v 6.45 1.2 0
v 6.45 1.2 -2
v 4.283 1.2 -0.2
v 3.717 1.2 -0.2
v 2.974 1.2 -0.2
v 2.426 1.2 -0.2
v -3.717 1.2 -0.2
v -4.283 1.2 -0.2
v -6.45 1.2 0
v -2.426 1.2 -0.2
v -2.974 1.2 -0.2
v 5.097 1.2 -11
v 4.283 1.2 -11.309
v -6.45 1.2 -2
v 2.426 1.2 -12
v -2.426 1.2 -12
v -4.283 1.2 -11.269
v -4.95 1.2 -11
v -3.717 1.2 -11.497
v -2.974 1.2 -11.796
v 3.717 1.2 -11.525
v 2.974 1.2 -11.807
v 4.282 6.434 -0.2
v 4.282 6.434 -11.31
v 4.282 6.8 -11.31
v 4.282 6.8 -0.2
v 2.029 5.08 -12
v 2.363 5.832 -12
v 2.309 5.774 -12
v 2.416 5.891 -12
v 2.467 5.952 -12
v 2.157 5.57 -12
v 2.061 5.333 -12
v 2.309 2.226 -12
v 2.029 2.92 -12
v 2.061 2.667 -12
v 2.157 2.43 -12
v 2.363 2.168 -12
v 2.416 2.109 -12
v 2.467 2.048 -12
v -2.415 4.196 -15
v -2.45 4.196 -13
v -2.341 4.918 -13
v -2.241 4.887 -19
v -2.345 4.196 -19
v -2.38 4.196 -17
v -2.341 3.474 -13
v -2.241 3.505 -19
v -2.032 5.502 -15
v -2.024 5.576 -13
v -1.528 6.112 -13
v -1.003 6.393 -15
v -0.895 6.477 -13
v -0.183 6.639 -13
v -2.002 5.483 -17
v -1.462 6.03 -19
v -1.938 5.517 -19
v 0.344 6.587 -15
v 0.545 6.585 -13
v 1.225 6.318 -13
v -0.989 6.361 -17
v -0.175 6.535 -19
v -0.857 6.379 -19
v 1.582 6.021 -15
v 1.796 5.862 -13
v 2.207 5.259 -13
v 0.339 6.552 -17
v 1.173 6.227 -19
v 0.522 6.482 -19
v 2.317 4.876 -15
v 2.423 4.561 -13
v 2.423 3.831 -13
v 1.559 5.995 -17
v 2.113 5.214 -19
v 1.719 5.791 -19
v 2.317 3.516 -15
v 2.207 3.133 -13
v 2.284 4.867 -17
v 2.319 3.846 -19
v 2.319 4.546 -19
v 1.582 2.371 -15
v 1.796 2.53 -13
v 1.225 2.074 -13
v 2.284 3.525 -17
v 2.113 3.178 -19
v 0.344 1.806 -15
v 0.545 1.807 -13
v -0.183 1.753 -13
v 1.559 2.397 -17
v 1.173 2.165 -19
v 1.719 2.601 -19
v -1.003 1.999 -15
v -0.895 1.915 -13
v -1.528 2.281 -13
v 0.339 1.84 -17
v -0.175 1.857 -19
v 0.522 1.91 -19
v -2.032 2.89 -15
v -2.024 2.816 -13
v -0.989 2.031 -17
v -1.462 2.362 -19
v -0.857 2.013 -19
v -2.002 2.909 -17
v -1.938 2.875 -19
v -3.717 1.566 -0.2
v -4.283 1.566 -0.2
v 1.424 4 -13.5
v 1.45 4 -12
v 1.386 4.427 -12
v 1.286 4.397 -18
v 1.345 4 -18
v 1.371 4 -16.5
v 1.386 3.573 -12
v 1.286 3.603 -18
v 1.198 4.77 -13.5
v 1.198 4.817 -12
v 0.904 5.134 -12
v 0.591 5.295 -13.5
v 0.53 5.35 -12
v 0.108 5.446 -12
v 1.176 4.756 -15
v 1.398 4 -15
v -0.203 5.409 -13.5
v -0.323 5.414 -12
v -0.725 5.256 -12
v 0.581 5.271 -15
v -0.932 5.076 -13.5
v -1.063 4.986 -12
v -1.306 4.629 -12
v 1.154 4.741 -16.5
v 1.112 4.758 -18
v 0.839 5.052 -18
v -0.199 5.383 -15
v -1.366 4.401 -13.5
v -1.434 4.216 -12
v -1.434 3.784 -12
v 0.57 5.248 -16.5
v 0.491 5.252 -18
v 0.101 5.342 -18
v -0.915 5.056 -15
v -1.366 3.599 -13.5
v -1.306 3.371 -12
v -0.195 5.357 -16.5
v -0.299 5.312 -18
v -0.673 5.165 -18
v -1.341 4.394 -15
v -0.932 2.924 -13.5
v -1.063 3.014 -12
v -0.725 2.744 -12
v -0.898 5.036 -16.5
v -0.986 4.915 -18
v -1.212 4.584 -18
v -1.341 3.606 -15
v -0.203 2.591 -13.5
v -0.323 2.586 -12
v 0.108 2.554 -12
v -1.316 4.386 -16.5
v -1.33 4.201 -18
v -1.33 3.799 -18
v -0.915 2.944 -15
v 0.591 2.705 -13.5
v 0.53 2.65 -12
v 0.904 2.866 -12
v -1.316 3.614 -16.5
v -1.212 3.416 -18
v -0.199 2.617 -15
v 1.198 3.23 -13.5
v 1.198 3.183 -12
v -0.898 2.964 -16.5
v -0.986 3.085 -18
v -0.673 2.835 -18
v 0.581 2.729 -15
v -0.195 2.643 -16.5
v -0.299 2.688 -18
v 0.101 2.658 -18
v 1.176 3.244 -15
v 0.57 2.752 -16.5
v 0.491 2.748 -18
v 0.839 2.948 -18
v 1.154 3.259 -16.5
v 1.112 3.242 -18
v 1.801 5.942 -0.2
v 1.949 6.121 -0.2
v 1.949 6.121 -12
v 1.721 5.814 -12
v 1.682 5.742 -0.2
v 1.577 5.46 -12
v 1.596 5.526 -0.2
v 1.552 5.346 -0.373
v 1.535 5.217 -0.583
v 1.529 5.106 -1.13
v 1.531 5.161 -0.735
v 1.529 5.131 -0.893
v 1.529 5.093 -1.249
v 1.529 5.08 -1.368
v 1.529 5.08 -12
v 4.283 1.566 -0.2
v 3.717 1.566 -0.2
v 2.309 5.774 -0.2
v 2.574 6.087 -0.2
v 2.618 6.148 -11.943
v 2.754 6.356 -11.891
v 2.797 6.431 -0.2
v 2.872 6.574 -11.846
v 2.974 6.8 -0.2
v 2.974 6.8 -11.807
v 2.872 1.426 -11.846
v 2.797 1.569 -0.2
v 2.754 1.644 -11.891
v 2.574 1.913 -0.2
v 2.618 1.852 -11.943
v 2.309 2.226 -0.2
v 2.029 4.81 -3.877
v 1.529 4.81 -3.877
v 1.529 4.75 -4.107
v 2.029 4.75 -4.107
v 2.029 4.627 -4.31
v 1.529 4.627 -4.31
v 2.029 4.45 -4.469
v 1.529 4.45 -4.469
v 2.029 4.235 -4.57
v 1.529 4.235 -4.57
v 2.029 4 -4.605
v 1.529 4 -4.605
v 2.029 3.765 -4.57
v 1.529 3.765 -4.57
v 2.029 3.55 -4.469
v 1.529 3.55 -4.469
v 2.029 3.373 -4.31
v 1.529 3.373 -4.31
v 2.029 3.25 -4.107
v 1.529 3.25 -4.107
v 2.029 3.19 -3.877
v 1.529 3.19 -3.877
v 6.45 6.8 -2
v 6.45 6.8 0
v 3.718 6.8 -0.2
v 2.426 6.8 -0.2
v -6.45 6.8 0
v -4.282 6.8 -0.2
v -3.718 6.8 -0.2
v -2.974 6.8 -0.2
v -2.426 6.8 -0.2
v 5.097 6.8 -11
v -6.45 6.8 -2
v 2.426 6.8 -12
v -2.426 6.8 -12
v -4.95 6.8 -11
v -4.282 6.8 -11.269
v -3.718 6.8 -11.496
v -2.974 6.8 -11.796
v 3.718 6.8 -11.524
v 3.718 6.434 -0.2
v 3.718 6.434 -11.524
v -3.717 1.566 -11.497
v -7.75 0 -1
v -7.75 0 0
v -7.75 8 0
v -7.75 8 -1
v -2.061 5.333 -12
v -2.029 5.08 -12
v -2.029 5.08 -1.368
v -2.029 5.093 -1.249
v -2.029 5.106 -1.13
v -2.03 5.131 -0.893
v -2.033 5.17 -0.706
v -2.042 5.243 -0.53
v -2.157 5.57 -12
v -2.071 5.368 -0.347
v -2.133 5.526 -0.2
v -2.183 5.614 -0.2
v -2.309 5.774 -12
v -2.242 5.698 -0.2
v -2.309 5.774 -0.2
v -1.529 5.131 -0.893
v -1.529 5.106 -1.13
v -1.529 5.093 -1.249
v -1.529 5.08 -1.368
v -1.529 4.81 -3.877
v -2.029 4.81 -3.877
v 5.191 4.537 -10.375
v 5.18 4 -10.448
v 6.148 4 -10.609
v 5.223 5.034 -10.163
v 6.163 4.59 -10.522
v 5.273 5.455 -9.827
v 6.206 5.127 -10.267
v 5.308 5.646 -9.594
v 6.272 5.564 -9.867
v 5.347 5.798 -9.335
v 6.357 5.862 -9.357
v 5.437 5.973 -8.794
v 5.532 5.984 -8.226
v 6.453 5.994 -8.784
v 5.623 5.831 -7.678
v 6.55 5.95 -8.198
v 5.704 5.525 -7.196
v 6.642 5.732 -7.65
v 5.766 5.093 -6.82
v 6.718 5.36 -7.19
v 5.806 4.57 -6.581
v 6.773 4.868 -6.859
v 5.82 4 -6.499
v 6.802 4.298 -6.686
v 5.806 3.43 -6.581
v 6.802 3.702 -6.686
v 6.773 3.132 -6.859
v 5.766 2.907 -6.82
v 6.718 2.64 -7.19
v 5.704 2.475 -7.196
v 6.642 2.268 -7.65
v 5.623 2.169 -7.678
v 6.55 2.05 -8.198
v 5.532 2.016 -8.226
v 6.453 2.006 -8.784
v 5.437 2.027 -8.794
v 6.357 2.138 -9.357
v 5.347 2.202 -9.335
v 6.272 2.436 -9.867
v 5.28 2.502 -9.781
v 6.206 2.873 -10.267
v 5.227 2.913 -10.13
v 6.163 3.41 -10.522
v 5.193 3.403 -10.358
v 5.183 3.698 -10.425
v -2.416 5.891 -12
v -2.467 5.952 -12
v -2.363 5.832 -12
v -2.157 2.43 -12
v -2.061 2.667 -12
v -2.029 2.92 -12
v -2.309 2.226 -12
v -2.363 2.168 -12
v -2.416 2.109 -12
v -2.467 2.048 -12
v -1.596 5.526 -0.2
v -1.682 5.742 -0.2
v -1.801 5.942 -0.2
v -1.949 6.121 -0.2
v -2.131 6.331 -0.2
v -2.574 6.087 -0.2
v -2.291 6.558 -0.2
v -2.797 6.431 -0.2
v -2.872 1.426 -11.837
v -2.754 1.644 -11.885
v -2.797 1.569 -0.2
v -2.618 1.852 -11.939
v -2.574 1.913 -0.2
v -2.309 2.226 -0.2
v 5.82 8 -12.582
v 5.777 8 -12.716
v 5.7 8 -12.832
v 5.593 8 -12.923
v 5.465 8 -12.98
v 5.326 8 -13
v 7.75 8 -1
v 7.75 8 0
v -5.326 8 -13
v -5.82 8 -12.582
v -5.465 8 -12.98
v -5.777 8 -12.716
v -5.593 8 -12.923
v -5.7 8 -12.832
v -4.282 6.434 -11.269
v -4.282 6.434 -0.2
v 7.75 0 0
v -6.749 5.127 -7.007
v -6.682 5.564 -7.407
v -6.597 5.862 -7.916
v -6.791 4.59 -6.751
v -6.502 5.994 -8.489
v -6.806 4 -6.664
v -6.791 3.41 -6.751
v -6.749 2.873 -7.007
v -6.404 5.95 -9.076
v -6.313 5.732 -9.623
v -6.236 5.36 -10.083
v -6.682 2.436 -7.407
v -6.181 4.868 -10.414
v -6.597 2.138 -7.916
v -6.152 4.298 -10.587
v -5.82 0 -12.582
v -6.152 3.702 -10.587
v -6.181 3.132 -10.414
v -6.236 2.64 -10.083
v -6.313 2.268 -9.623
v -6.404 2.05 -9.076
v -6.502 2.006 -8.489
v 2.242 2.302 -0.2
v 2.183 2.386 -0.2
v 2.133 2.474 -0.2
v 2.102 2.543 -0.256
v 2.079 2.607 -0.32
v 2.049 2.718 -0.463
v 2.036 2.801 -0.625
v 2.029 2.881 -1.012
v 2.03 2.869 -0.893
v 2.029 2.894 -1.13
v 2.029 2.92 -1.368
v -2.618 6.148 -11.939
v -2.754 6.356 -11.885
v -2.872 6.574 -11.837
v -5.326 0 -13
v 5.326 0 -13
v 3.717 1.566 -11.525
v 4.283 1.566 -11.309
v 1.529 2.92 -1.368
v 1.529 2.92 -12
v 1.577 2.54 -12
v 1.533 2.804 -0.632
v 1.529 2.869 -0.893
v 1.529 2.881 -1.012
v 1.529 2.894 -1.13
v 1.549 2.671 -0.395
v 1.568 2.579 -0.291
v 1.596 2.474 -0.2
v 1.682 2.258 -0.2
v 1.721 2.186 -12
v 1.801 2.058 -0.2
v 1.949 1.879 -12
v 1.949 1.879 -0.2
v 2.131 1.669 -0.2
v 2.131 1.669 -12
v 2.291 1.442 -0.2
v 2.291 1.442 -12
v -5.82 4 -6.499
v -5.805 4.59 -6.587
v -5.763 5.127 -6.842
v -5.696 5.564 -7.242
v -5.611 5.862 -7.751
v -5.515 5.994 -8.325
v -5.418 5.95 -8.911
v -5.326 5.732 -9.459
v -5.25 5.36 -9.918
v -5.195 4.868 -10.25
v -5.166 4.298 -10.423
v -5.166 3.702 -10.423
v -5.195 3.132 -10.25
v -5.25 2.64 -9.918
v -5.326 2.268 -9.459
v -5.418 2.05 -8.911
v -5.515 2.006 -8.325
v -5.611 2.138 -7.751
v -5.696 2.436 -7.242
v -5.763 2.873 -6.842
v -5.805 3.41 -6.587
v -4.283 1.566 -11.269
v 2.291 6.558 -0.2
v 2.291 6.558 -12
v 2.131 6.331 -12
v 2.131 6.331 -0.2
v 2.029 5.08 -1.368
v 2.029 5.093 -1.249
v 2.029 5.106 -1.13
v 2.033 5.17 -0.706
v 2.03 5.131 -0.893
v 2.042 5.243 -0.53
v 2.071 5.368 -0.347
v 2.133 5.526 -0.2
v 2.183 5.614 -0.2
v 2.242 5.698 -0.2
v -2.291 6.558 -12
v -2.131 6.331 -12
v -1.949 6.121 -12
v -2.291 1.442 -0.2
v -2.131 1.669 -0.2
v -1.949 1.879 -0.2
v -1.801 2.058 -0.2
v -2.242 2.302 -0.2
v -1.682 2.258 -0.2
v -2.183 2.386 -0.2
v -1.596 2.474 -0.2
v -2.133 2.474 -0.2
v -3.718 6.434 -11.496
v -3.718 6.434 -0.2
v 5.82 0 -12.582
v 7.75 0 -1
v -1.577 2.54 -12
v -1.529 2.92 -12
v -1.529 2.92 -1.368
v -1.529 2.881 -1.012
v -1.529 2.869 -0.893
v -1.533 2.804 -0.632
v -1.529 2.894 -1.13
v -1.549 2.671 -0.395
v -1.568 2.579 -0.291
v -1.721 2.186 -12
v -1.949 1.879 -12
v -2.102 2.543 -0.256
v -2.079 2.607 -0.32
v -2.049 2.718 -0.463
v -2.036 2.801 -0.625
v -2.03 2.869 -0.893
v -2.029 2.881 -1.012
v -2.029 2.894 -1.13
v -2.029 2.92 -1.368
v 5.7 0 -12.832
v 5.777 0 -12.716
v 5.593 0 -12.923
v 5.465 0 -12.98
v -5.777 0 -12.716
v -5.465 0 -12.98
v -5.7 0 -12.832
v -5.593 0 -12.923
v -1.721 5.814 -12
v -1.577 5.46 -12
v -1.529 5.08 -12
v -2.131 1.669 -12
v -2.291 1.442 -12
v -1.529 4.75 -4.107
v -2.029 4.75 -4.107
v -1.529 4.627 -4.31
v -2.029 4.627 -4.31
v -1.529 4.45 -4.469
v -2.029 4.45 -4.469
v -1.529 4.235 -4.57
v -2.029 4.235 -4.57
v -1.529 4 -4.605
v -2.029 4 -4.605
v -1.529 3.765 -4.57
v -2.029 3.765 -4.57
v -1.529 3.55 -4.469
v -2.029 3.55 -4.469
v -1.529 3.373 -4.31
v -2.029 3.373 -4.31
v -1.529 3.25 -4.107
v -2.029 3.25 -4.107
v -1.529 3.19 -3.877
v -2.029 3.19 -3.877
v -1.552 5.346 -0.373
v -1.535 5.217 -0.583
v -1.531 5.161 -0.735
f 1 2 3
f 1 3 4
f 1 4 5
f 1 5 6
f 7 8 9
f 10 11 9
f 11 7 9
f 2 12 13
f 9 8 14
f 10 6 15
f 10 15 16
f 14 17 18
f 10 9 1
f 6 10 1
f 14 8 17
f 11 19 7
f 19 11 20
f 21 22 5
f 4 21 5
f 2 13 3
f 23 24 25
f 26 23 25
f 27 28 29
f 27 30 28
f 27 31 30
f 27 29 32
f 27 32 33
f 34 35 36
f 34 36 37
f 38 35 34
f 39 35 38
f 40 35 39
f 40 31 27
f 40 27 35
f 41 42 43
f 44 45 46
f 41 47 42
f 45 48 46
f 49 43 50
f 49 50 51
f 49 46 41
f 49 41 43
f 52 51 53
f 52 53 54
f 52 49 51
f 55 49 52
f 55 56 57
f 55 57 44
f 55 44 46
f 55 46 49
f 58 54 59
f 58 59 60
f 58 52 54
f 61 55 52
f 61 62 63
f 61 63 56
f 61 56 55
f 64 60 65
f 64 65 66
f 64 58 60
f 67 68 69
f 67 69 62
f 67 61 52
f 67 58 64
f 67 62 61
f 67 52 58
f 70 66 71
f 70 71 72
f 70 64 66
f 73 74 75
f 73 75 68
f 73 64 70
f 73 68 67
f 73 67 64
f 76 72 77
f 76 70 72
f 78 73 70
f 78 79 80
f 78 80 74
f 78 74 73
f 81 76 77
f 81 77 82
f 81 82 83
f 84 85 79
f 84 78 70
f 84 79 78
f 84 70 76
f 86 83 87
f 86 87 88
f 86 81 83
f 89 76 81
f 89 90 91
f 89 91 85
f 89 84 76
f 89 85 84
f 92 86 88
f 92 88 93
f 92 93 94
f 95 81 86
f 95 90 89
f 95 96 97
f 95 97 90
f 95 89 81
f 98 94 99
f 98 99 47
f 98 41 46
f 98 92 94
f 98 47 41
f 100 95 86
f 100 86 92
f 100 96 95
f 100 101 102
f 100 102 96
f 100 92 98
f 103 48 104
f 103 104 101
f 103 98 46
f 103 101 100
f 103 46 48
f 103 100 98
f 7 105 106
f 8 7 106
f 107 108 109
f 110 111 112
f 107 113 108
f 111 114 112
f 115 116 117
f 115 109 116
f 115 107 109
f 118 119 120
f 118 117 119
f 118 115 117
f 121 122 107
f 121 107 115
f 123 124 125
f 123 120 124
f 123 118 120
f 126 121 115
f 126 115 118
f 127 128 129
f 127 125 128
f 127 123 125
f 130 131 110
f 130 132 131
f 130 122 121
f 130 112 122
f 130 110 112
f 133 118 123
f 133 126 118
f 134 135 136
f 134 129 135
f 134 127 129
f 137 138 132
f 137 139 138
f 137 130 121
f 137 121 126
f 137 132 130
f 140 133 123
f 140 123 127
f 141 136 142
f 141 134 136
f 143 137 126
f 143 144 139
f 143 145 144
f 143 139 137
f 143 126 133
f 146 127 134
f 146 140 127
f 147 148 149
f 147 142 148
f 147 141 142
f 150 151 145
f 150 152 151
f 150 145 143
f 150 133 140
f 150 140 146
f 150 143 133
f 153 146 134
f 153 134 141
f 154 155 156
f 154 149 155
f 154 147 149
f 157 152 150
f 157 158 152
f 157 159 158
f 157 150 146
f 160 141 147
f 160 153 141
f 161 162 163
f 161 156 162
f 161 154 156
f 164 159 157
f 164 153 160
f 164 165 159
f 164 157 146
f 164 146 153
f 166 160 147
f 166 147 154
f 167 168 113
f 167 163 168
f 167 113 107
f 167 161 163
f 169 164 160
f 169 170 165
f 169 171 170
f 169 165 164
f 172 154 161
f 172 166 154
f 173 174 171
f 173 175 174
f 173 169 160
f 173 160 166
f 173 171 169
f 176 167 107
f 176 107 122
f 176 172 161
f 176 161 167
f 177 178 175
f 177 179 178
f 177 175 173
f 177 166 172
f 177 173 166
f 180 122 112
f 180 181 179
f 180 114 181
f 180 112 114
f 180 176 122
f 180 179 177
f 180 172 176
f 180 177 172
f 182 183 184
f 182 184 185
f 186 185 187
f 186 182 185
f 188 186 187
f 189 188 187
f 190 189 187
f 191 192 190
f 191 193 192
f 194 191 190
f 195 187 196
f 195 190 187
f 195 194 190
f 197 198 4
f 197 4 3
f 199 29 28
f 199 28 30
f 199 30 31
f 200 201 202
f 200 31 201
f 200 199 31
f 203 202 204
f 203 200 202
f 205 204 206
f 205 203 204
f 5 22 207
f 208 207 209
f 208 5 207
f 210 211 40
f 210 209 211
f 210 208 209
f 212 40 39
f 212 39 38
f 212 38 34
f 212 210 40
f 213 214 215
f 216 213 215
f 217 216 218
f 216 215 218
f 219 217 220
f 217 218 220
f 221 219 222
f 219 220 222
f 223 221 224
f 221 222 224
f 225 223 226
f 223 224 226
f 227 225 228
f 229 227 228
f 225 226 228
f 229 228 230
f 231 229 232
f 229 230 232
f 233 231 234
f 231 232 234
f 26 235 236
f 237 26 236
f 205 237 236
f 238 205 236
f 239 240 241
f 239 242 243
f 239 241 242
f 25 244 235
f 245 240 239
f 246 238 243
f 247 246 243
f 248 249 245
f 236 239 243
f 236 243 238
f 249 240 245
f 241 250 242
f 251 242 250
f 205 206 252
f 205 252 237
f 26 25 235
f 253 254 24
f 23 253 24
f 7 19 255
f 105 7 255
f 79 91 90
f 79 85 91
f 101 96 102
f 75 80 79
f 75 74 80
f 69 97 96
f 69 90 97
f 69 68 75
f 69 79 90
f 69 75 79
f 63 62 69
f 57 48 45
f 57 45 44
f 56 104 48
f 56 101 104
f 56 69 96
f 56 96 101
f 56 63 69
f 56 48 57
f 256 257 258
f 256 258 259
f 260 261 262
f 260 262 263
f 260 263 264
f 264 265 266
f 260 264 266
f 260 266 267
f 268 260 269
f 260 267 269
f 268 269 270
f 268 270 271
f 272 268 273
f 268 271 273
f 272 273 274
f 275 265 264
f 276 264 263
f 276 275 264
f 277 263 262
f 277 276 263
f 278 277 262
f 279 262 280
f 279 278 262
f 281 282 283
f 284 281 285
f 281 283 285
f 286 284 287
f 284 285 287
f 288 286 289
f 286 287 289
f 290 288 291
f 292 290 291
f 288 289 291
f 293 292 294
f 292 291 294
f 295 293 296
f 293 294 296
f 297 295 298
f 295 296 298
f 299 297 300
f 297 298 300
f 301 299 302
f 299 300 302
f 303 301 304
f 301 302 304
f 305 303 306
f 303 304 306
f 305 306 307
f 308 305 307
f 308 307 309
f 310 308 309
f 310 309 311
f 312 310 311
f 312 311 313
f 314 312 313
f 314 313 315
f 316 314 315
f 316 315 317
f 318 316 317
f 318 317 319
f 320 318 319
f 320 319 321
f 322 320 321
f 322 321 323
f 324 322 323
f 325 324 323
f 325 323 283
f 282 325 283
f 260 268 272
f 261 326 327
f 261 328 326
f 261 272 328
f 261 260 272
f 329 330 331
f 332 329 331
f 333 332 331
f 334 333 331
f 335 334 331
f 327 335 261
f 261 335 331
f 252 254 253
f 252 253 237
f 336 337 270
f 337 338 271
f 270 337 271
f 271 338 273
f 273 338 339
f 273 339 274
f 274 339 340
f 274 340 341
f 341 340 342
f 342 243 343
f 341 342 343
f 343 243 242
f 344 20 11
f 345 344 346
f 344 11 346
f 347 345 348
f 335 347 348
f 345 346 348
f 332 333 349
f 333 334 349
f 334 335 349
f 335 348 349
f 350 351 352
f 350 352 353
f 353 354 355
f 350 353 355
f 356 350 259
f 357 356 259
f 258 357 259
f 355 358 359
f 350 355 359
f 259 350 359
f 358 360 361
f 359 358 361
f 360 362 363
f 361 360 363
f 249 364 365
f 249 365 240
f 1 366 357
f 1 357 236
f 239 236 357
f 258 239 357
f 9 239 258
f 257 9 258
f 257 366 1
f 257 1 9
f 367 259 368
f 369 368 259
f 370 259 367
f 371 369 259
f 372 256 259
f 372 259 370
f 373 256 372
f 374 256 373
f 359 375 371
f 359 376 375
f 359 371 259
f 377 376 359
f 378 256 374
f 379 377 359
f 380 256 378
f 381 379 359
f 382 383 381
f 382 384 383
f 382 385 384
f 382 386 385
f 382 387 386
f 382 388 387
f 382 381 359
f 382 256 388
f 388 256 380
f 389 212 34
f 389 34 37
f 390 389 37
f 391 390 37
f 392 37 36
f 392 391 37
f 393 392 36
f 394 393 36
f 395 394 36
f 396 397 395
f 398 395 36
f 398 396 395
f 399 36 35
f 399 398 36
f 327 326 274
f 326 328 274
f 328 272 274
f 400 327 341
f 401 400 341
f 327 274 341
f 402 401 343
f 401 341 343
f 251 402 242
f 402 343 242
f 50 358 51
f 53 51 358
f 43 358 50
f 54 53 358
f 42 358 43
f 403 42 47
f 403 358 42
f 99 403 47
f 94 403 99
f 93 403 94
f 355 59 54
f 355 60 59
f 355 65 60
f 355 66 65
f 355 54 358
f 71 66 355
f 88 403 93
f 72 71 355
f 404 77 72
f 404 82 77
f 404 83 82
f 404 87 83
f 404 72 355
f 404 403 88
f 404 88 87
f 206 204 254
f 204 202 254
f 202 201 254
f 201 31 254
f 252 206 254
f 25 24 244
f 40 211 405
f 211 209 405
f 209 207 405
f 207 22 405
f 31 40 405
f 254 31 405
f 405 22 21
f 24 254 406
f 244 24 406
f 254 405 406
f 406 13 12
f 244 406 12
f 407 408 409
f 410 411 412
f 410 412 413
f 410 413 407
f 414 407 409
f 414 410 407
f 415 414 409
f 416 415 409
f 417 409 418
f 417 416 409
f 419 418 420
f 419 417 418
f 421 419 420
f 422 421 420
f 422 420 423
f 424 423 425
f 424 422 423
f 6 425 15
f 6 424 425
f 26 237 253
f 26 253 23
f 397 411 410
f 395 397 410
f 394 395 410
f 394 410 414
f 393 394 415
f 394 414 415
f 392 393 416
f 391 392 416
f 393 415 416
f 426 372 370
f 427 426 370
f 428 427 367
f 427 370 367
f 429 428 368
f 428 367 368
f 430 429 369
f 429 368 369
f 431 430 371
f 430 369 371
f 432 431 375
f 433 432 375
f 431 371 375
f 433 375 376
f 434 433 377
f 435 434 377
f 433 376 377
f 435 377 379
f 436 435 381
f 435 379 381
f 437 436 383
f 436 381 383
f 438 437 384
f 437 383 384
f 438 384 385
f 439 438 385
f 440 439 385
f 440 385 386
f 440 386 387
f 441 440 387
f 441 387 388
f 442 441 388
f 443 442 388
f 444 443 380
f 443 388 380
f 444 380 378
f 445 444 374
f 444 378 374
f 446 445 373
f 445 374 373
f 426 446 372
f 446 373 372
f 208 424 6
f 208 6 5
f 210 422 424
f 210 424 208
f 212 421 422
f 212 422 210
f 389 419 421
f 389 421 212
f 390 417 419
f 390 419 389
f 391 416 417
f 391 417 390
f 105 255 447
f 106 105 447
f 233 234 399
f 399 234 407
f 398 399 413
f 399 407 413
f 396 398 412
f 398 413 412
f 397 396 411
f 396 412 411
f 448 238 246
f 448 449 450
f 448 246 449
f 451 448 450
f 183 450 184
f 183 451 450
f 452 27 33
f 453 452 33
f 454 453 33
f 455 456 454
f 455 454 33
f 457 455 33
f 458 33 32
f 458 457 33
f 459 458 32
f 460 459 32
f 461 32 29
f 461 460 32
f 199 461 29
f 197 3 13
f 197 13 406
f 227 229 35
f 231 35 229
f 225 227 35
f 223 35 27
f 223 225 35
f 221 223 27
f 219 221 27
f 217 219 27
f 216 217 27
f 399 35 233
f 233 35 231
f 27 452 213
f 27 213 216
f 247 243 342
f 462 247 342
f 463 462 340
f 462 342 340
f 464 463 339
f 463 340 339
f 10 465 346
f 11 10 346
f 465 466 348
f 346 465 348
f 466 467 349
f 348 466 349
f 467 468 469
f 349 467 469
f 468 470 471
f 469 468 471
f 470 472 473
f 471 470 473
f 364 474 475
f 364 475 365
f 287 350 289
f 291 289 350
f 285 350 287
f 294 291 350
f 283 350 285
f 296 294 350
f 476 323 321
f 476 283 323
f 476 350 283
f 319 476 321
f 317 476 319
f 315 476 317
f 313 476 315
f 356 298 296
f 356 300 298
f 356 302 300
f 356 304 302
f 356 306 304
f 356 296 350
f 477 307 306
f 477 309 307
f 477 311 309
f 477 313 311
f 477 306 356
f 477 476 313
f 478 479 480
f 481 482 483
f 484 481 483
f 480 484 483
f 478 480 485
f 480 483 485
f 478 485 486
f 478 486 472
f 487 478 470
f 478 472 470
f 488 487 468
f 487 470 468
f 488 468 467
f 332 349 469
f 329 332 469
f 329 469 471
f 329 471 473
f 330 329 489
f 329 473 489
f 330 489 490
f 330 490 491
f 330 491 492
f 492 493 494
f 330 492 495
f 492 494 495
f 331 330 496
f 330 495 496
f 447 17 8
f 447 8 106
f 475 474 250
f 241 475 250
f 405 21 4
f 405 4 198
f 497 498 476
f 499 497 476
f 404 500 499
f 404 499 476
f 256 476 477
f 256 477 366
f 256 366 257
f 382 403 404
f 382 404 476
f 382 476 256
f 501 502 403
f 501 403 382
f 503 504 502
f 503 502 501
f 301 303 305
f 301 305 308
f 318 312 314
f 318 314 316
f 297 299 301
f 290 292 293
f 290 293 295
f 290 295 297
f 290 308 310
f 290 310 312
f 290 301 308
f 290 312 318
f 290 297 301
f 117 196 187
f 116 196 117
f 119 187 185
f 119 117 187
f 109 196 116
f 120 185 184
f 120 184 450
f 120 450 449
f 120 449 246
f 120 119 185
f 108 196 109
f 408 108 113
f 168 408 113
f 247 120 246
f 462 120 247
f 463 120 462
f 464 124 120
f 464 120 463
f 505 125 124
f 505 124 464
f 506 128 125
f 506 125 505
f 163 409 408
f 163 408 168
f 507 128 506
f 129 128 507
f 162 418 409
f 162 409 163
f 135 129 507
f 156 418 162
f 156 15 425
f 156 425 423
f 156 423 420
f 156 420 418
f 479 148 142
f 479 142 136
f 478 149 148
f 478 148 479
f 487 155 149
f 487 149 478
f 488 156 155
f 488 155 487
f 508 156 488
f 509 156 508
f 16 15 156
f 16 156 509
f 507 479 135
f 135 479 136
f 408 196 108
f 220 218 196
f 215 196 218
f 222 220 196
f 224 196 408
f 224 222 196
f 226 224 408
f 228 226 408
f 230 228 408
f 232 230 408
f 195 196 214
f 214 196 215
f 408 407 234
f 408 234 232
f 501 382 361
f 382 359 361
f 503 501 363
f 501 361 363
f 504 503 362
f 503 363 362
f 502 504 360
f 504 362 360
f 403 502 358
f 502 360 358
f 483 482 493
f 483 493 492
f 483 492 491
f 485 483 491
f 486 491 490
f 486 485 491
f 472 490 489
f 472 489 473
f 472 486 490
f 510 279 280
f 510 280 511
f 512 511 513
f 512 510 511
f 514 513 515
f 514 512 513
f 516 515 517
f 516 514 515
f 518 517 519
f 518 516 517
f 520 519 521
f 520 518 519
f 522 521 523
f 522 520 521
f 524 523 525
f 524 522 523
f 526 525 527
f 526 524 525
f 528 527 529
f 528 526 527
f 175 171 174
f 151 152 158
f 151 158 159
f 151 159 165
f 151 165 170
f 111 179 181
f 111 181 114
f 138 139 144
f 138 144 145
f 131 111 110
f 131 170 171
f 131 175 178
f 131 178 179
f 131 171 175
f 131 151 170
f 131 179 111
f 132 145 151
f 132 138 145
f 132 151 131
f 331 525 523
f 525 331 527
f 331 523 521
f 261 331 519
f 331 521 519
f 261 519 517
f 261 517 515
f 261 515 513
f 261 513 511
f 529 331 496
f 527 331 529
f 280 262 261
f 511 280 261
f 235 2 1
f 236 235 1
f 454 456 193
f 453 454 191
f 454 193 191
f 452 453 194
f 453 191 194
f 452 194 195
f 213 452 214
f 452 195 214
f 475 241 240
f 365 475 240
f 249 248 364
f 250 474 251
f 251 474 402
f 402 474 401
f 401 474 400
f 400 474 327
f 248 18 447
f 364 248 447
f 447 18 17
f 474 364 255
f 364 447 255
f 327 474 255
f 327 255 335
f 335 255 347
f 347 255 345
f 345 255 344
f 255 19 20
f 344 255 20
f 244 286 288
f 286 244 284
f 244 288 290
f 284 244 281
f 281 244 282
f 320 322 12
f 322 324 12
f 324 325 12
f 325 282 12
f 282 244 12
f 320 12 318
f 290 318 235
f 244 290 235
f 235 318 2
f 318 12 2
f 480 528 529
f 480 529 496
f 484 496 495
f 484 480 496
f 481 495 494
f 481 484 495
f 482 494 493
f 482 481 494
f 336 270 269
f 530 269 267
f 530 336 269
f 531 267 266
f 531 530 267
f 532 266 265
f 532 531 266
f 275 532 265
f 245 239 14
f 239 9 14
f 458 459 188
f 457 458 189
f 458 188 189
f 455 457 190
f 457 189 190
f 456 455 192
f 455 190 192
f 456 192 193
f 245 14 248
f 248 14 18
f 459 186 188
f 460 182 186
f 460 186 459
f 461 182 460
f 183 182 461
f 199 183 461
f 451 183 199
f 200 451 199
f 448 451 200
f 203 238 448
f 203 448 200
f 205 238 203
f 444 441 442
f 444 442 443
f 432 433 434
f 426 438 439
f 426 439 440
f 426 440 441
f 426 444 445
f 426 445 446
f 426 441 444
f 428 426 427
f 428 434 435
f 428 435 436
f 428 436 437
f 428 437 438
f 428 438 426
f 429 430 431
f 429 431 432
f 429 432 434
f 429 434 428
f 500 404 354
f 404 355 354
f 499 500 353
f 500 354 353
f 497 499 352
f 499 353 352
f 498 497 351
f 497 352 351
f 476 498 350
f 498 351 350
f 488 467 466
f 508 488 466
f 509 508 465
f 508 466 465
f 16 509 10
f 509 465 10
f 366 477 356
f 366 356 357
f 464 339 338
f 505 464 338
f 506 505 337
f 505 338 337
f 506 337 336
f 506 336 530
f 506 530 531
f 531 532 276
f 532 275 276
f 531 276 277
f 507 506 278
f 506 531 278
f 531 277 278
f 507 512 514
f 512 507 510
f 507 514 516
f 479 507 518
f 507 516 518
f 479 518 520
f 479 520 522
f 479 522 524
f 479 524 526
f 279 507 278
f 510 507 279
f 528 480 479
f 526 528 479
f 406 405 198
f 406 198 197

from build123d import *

# Parameters (mm, degrees)
BOSS_EXTRUDE1_DEPTH     = 8
FILLET1_R               = 0.5
SKETCH5_R               = 2.45
BOSS_EXTRUDE2_DEPTH     = 6
BOSS_EXTRUDE2_TAPER     = 1
CUT_EXTRUDE4_DEPTH      = 2.8
CUT_EXTRUDE4_DEPTH_BACK = 2.8
SKETCH10_R              = 1.45
CUT_EXTRUDE5_DEPTH      = 6
CUT_EXTRUDE5_TAPER      = 1
SKETCH7_R               = 2
CUT_EXTRUDE6_DEPTH      = 1
SKETCH8_R               = 2
CUT_EXTRUDE7_DEPTH      = 1
BOSS_EXTRUDE4_START     = -0.2
SKETCH11_W              = 0.564613496
SKETCH11_H              = 0.366319064
SKETCH11_W_2            = 0.56674541
SKETCH11_H_2            = 0.366442951
BOSS_EXTRUDE4_DEPTH     = 12.3
CUT_EXTRUDE8_DEPTH      = 3
CUT_EXTRUDE8_DEPTH_BACK = 2.5


with BuildPart() as part:
    # Sketch3 → Boss-Extrude1 (new body)
    with BuildSketch(Plane(origin=(0, 0, 0), x_dir=(1, 0, 0), z_dir=(0, 1, 0))):
        Polygon((7.75, 0), (-7.75, 0), (-7.75, 1), (-5.75, 13), (5.75, 13), (7.75, 1), align=None)
    extrude(amount=BOSS_EXTRUDE1_DEPTH)

    # Fillet1
    fillet1_edges = [part.edges().sort_by_distance(p)[0] for p in [
        (5.75, 4, -13),
        (-5.75, 4, -13),
    ]]
    fillet(fillet1_edges, radius=FILLET1_R)

    # Sketch5 → Boss-Extrude2 (add)
    with BuildSketch(Plane(origin=(0, 0, -13), x_dir=(-1, 0, 0), z_dir=(0, 0, -1))):
        with Locations((0, 4.19602759)):
            Circle(SKETCH5_R)
    extrude(amount=BOSS_EXTRUDE2_DEPTH, taper=BOSS_EXTRUDE2_TAPER)

    # Sketch9 → Cut-Extrude4 (cut, two sides)
    with BuildSketch(Plane(origin=(0, 4, 0), x_dir=(1, 0, 0), z_dir=(0, 1, 0))) as cut_extrude4_sk:
        Polygon((-6.45, 0), (-6.45, 2), (-4.95, 11), (-2.467455065, 12), (-1.480633364, 12), (1.480633364, 12), (2.467455065, 12), (5.096667593, 11), (6.45, 2), (6.45, 0), align=None)
    extrude(amount=CUT_EXTRUDE4_DEPTH, mode=Mode.SUBTRACT)
    extrude(cut_extrude4_sk.sketch, amount=-CUT_EXTRUDE4_DEPTH_BACK, mode=Mode.SUBTRACT)

    # Sketch10 → Cut-Extrude5 (cut)
    with BuildSketch(Plane.XY.offset(-12)):
        with Locations((0, 4)):
            Circle(SKETCH10_R)
    extrude(amount=-CUT_EXTRUDE5_DEPTH, taper=CUT_EXTRUDE5_TAPER, mode=Mode.SUBTRACT)

    # Sketch7 → Cut-Extrude6 (cut)
    with BuildSketch(Plane(origin=(7.702702703, 0, -1.283783784), x_dir=(-0.164398987, 0, -0.986393924), z_dir=(0.986393924, 0, -0.164398987))):
        with Locations((7.454263289, 4)):
            Circle(SKETCH7_R)
    extrude(amount=-CUT_EXTRUDE6_DEPTH, mode=Mode.SUBTRACT)

    # Sketch8 → Cut-Extrude7 (cut)
    with BuildSketch(Plane(origin=(-7.702702703, 0, -1.283783784), x_dir=(-0.164398987, 0, 0.986393924), z_dir=(-0.986393924, 0, -0.164398987))):
        with Locations((-7.454263289, 4)):
            Circle(SKETCH8_R)
    extrude(amount=-CUT_EXTRUDE7_DEPTH, mode=Mode.SUBTRACT)

    # Sketch11 → Boss-Extrude4 (add)
    with BuildSketch(Plane.XY.offset(BOSS_EXTRUDE4_START)):
        with BuildLine():
            Line((1.528607349, 5.080212301), (1.528607349, 4))
            Line((1.528607349, 4), (2.028607349, 4))
            Line((2.028607349, 4), (2.028607349, 5.080212301))
            ThreePointArc((2.028607349, 5.080212301), (2.101266499, 5.454430085), (2.308685248, 5.774267176))
            ThreePointArc((2.308685248, 5.774267176), (2.690610434, 6.255141934), (2.973871917, 6.8))
            Line((2.973871917, 6.8), (2.426326427, 6.8))
            ThreePointArc((2.426326427, 6.8), (2.213690864, 6.442234714), (1.948724198, 6.121294613))
            ThreePointArc((1.948724198, 6.121294613), (1.637596075, 5.641538977), (1.528607349, 5.080212301))
        make_face()
        with BuildLine():
            ThreePointArc((1.948724198, 1.878705387), (2.213690864, 1.557765286), (2.426326427, 1.2))
            Line((2.426326427, 1.2), (2.973871917, 1.2))
            ThreePointArc((2.973871917, 1.2), (2.690610434, 1.744858066), (2.308685248, 2.225732824))
            ThreePointArc((2.308685248, 2.225732824), (2.101266499, 2.545569915), (2.028607349, 2.919787699))
            Line((2.028607349, 2.919787699), (2.028607349, 4))
            Line((2.028607349, 4), (1.528607349, 4))
            Line((1.528607349, 4), (1.528607349, 2.919787699))
            ThreePointArc((1.528607349, 2.919787699), (1.637596075, 2.358461023), (1.948724198, 1.878705387))
        make_face()
        with Locations((4, 6.616840468)):
            Rectangle(SKETCH11_W, SKETCH11_H)
        with Locations((4, 1.383221476)):
            Rectangle(SKETCH11_W_2, SKETCH11_H_2)
    boss_extrude4 = extrude(amount=-BOSS_EXTRUDE4_DEPTH)

    # Mirror1: Boss-Extrude4 across plane
    add(boss_extrude4.mirror(Plane(origin=(0, 0, 0), x_dir=(0, 0, 1), z_dir=(1, 0, 0))))

    # Sketch12 → Cut-Extrude8 (cut, two sides)
    with BuildSketch(Plane(origin=(0, 0, 0), x_dir=(0, 0, -1), z_dir=(1, 0, 0))) as cut_extrude8_sk:
        with BuildLine():
            Line((0, 6.910389693), (0, 6.125652773))
            ThreePointArc((0, 6.125652773), (0.255989552, 5.45748479), (0.892896907, 5.131404852))
            Line((0.892896907, 5.131404852), (3.877195183, 4.809928115))
            ThreePointArc((3.877195183, 4.809928115), (4.60456136, 4), (3.877195183, 3.190071885))
            Line((3.877195183, 3.190071885), (0.892896907, 2.868595148))
            ThreePointArc((0.892896907, 2.868595148), (0.255989552, 2.54251521), (0, 1.874347227))
            Line((0, 1.874347227), (0, 1.089610307))
            Line((0, 1.089610307), (-0.964322492, 1.089610307))
            Line((-0.964322492, 1.089610307), (-0.964322492, 6.910389693))
            Line((-0.964322492, 6.910389693), (0, 6.910389693))
        make_face()
    extrude(amount=CUT_EXTRUDE8_DEPTH, mode=Mode.SUBTRACT)
    extrude(cut_extrude8_sk.sketch, amount=-CUT_EXTRUDE8_DEPTH_BACK, mode=Mode.SUBTRACT)


solid = part.part
